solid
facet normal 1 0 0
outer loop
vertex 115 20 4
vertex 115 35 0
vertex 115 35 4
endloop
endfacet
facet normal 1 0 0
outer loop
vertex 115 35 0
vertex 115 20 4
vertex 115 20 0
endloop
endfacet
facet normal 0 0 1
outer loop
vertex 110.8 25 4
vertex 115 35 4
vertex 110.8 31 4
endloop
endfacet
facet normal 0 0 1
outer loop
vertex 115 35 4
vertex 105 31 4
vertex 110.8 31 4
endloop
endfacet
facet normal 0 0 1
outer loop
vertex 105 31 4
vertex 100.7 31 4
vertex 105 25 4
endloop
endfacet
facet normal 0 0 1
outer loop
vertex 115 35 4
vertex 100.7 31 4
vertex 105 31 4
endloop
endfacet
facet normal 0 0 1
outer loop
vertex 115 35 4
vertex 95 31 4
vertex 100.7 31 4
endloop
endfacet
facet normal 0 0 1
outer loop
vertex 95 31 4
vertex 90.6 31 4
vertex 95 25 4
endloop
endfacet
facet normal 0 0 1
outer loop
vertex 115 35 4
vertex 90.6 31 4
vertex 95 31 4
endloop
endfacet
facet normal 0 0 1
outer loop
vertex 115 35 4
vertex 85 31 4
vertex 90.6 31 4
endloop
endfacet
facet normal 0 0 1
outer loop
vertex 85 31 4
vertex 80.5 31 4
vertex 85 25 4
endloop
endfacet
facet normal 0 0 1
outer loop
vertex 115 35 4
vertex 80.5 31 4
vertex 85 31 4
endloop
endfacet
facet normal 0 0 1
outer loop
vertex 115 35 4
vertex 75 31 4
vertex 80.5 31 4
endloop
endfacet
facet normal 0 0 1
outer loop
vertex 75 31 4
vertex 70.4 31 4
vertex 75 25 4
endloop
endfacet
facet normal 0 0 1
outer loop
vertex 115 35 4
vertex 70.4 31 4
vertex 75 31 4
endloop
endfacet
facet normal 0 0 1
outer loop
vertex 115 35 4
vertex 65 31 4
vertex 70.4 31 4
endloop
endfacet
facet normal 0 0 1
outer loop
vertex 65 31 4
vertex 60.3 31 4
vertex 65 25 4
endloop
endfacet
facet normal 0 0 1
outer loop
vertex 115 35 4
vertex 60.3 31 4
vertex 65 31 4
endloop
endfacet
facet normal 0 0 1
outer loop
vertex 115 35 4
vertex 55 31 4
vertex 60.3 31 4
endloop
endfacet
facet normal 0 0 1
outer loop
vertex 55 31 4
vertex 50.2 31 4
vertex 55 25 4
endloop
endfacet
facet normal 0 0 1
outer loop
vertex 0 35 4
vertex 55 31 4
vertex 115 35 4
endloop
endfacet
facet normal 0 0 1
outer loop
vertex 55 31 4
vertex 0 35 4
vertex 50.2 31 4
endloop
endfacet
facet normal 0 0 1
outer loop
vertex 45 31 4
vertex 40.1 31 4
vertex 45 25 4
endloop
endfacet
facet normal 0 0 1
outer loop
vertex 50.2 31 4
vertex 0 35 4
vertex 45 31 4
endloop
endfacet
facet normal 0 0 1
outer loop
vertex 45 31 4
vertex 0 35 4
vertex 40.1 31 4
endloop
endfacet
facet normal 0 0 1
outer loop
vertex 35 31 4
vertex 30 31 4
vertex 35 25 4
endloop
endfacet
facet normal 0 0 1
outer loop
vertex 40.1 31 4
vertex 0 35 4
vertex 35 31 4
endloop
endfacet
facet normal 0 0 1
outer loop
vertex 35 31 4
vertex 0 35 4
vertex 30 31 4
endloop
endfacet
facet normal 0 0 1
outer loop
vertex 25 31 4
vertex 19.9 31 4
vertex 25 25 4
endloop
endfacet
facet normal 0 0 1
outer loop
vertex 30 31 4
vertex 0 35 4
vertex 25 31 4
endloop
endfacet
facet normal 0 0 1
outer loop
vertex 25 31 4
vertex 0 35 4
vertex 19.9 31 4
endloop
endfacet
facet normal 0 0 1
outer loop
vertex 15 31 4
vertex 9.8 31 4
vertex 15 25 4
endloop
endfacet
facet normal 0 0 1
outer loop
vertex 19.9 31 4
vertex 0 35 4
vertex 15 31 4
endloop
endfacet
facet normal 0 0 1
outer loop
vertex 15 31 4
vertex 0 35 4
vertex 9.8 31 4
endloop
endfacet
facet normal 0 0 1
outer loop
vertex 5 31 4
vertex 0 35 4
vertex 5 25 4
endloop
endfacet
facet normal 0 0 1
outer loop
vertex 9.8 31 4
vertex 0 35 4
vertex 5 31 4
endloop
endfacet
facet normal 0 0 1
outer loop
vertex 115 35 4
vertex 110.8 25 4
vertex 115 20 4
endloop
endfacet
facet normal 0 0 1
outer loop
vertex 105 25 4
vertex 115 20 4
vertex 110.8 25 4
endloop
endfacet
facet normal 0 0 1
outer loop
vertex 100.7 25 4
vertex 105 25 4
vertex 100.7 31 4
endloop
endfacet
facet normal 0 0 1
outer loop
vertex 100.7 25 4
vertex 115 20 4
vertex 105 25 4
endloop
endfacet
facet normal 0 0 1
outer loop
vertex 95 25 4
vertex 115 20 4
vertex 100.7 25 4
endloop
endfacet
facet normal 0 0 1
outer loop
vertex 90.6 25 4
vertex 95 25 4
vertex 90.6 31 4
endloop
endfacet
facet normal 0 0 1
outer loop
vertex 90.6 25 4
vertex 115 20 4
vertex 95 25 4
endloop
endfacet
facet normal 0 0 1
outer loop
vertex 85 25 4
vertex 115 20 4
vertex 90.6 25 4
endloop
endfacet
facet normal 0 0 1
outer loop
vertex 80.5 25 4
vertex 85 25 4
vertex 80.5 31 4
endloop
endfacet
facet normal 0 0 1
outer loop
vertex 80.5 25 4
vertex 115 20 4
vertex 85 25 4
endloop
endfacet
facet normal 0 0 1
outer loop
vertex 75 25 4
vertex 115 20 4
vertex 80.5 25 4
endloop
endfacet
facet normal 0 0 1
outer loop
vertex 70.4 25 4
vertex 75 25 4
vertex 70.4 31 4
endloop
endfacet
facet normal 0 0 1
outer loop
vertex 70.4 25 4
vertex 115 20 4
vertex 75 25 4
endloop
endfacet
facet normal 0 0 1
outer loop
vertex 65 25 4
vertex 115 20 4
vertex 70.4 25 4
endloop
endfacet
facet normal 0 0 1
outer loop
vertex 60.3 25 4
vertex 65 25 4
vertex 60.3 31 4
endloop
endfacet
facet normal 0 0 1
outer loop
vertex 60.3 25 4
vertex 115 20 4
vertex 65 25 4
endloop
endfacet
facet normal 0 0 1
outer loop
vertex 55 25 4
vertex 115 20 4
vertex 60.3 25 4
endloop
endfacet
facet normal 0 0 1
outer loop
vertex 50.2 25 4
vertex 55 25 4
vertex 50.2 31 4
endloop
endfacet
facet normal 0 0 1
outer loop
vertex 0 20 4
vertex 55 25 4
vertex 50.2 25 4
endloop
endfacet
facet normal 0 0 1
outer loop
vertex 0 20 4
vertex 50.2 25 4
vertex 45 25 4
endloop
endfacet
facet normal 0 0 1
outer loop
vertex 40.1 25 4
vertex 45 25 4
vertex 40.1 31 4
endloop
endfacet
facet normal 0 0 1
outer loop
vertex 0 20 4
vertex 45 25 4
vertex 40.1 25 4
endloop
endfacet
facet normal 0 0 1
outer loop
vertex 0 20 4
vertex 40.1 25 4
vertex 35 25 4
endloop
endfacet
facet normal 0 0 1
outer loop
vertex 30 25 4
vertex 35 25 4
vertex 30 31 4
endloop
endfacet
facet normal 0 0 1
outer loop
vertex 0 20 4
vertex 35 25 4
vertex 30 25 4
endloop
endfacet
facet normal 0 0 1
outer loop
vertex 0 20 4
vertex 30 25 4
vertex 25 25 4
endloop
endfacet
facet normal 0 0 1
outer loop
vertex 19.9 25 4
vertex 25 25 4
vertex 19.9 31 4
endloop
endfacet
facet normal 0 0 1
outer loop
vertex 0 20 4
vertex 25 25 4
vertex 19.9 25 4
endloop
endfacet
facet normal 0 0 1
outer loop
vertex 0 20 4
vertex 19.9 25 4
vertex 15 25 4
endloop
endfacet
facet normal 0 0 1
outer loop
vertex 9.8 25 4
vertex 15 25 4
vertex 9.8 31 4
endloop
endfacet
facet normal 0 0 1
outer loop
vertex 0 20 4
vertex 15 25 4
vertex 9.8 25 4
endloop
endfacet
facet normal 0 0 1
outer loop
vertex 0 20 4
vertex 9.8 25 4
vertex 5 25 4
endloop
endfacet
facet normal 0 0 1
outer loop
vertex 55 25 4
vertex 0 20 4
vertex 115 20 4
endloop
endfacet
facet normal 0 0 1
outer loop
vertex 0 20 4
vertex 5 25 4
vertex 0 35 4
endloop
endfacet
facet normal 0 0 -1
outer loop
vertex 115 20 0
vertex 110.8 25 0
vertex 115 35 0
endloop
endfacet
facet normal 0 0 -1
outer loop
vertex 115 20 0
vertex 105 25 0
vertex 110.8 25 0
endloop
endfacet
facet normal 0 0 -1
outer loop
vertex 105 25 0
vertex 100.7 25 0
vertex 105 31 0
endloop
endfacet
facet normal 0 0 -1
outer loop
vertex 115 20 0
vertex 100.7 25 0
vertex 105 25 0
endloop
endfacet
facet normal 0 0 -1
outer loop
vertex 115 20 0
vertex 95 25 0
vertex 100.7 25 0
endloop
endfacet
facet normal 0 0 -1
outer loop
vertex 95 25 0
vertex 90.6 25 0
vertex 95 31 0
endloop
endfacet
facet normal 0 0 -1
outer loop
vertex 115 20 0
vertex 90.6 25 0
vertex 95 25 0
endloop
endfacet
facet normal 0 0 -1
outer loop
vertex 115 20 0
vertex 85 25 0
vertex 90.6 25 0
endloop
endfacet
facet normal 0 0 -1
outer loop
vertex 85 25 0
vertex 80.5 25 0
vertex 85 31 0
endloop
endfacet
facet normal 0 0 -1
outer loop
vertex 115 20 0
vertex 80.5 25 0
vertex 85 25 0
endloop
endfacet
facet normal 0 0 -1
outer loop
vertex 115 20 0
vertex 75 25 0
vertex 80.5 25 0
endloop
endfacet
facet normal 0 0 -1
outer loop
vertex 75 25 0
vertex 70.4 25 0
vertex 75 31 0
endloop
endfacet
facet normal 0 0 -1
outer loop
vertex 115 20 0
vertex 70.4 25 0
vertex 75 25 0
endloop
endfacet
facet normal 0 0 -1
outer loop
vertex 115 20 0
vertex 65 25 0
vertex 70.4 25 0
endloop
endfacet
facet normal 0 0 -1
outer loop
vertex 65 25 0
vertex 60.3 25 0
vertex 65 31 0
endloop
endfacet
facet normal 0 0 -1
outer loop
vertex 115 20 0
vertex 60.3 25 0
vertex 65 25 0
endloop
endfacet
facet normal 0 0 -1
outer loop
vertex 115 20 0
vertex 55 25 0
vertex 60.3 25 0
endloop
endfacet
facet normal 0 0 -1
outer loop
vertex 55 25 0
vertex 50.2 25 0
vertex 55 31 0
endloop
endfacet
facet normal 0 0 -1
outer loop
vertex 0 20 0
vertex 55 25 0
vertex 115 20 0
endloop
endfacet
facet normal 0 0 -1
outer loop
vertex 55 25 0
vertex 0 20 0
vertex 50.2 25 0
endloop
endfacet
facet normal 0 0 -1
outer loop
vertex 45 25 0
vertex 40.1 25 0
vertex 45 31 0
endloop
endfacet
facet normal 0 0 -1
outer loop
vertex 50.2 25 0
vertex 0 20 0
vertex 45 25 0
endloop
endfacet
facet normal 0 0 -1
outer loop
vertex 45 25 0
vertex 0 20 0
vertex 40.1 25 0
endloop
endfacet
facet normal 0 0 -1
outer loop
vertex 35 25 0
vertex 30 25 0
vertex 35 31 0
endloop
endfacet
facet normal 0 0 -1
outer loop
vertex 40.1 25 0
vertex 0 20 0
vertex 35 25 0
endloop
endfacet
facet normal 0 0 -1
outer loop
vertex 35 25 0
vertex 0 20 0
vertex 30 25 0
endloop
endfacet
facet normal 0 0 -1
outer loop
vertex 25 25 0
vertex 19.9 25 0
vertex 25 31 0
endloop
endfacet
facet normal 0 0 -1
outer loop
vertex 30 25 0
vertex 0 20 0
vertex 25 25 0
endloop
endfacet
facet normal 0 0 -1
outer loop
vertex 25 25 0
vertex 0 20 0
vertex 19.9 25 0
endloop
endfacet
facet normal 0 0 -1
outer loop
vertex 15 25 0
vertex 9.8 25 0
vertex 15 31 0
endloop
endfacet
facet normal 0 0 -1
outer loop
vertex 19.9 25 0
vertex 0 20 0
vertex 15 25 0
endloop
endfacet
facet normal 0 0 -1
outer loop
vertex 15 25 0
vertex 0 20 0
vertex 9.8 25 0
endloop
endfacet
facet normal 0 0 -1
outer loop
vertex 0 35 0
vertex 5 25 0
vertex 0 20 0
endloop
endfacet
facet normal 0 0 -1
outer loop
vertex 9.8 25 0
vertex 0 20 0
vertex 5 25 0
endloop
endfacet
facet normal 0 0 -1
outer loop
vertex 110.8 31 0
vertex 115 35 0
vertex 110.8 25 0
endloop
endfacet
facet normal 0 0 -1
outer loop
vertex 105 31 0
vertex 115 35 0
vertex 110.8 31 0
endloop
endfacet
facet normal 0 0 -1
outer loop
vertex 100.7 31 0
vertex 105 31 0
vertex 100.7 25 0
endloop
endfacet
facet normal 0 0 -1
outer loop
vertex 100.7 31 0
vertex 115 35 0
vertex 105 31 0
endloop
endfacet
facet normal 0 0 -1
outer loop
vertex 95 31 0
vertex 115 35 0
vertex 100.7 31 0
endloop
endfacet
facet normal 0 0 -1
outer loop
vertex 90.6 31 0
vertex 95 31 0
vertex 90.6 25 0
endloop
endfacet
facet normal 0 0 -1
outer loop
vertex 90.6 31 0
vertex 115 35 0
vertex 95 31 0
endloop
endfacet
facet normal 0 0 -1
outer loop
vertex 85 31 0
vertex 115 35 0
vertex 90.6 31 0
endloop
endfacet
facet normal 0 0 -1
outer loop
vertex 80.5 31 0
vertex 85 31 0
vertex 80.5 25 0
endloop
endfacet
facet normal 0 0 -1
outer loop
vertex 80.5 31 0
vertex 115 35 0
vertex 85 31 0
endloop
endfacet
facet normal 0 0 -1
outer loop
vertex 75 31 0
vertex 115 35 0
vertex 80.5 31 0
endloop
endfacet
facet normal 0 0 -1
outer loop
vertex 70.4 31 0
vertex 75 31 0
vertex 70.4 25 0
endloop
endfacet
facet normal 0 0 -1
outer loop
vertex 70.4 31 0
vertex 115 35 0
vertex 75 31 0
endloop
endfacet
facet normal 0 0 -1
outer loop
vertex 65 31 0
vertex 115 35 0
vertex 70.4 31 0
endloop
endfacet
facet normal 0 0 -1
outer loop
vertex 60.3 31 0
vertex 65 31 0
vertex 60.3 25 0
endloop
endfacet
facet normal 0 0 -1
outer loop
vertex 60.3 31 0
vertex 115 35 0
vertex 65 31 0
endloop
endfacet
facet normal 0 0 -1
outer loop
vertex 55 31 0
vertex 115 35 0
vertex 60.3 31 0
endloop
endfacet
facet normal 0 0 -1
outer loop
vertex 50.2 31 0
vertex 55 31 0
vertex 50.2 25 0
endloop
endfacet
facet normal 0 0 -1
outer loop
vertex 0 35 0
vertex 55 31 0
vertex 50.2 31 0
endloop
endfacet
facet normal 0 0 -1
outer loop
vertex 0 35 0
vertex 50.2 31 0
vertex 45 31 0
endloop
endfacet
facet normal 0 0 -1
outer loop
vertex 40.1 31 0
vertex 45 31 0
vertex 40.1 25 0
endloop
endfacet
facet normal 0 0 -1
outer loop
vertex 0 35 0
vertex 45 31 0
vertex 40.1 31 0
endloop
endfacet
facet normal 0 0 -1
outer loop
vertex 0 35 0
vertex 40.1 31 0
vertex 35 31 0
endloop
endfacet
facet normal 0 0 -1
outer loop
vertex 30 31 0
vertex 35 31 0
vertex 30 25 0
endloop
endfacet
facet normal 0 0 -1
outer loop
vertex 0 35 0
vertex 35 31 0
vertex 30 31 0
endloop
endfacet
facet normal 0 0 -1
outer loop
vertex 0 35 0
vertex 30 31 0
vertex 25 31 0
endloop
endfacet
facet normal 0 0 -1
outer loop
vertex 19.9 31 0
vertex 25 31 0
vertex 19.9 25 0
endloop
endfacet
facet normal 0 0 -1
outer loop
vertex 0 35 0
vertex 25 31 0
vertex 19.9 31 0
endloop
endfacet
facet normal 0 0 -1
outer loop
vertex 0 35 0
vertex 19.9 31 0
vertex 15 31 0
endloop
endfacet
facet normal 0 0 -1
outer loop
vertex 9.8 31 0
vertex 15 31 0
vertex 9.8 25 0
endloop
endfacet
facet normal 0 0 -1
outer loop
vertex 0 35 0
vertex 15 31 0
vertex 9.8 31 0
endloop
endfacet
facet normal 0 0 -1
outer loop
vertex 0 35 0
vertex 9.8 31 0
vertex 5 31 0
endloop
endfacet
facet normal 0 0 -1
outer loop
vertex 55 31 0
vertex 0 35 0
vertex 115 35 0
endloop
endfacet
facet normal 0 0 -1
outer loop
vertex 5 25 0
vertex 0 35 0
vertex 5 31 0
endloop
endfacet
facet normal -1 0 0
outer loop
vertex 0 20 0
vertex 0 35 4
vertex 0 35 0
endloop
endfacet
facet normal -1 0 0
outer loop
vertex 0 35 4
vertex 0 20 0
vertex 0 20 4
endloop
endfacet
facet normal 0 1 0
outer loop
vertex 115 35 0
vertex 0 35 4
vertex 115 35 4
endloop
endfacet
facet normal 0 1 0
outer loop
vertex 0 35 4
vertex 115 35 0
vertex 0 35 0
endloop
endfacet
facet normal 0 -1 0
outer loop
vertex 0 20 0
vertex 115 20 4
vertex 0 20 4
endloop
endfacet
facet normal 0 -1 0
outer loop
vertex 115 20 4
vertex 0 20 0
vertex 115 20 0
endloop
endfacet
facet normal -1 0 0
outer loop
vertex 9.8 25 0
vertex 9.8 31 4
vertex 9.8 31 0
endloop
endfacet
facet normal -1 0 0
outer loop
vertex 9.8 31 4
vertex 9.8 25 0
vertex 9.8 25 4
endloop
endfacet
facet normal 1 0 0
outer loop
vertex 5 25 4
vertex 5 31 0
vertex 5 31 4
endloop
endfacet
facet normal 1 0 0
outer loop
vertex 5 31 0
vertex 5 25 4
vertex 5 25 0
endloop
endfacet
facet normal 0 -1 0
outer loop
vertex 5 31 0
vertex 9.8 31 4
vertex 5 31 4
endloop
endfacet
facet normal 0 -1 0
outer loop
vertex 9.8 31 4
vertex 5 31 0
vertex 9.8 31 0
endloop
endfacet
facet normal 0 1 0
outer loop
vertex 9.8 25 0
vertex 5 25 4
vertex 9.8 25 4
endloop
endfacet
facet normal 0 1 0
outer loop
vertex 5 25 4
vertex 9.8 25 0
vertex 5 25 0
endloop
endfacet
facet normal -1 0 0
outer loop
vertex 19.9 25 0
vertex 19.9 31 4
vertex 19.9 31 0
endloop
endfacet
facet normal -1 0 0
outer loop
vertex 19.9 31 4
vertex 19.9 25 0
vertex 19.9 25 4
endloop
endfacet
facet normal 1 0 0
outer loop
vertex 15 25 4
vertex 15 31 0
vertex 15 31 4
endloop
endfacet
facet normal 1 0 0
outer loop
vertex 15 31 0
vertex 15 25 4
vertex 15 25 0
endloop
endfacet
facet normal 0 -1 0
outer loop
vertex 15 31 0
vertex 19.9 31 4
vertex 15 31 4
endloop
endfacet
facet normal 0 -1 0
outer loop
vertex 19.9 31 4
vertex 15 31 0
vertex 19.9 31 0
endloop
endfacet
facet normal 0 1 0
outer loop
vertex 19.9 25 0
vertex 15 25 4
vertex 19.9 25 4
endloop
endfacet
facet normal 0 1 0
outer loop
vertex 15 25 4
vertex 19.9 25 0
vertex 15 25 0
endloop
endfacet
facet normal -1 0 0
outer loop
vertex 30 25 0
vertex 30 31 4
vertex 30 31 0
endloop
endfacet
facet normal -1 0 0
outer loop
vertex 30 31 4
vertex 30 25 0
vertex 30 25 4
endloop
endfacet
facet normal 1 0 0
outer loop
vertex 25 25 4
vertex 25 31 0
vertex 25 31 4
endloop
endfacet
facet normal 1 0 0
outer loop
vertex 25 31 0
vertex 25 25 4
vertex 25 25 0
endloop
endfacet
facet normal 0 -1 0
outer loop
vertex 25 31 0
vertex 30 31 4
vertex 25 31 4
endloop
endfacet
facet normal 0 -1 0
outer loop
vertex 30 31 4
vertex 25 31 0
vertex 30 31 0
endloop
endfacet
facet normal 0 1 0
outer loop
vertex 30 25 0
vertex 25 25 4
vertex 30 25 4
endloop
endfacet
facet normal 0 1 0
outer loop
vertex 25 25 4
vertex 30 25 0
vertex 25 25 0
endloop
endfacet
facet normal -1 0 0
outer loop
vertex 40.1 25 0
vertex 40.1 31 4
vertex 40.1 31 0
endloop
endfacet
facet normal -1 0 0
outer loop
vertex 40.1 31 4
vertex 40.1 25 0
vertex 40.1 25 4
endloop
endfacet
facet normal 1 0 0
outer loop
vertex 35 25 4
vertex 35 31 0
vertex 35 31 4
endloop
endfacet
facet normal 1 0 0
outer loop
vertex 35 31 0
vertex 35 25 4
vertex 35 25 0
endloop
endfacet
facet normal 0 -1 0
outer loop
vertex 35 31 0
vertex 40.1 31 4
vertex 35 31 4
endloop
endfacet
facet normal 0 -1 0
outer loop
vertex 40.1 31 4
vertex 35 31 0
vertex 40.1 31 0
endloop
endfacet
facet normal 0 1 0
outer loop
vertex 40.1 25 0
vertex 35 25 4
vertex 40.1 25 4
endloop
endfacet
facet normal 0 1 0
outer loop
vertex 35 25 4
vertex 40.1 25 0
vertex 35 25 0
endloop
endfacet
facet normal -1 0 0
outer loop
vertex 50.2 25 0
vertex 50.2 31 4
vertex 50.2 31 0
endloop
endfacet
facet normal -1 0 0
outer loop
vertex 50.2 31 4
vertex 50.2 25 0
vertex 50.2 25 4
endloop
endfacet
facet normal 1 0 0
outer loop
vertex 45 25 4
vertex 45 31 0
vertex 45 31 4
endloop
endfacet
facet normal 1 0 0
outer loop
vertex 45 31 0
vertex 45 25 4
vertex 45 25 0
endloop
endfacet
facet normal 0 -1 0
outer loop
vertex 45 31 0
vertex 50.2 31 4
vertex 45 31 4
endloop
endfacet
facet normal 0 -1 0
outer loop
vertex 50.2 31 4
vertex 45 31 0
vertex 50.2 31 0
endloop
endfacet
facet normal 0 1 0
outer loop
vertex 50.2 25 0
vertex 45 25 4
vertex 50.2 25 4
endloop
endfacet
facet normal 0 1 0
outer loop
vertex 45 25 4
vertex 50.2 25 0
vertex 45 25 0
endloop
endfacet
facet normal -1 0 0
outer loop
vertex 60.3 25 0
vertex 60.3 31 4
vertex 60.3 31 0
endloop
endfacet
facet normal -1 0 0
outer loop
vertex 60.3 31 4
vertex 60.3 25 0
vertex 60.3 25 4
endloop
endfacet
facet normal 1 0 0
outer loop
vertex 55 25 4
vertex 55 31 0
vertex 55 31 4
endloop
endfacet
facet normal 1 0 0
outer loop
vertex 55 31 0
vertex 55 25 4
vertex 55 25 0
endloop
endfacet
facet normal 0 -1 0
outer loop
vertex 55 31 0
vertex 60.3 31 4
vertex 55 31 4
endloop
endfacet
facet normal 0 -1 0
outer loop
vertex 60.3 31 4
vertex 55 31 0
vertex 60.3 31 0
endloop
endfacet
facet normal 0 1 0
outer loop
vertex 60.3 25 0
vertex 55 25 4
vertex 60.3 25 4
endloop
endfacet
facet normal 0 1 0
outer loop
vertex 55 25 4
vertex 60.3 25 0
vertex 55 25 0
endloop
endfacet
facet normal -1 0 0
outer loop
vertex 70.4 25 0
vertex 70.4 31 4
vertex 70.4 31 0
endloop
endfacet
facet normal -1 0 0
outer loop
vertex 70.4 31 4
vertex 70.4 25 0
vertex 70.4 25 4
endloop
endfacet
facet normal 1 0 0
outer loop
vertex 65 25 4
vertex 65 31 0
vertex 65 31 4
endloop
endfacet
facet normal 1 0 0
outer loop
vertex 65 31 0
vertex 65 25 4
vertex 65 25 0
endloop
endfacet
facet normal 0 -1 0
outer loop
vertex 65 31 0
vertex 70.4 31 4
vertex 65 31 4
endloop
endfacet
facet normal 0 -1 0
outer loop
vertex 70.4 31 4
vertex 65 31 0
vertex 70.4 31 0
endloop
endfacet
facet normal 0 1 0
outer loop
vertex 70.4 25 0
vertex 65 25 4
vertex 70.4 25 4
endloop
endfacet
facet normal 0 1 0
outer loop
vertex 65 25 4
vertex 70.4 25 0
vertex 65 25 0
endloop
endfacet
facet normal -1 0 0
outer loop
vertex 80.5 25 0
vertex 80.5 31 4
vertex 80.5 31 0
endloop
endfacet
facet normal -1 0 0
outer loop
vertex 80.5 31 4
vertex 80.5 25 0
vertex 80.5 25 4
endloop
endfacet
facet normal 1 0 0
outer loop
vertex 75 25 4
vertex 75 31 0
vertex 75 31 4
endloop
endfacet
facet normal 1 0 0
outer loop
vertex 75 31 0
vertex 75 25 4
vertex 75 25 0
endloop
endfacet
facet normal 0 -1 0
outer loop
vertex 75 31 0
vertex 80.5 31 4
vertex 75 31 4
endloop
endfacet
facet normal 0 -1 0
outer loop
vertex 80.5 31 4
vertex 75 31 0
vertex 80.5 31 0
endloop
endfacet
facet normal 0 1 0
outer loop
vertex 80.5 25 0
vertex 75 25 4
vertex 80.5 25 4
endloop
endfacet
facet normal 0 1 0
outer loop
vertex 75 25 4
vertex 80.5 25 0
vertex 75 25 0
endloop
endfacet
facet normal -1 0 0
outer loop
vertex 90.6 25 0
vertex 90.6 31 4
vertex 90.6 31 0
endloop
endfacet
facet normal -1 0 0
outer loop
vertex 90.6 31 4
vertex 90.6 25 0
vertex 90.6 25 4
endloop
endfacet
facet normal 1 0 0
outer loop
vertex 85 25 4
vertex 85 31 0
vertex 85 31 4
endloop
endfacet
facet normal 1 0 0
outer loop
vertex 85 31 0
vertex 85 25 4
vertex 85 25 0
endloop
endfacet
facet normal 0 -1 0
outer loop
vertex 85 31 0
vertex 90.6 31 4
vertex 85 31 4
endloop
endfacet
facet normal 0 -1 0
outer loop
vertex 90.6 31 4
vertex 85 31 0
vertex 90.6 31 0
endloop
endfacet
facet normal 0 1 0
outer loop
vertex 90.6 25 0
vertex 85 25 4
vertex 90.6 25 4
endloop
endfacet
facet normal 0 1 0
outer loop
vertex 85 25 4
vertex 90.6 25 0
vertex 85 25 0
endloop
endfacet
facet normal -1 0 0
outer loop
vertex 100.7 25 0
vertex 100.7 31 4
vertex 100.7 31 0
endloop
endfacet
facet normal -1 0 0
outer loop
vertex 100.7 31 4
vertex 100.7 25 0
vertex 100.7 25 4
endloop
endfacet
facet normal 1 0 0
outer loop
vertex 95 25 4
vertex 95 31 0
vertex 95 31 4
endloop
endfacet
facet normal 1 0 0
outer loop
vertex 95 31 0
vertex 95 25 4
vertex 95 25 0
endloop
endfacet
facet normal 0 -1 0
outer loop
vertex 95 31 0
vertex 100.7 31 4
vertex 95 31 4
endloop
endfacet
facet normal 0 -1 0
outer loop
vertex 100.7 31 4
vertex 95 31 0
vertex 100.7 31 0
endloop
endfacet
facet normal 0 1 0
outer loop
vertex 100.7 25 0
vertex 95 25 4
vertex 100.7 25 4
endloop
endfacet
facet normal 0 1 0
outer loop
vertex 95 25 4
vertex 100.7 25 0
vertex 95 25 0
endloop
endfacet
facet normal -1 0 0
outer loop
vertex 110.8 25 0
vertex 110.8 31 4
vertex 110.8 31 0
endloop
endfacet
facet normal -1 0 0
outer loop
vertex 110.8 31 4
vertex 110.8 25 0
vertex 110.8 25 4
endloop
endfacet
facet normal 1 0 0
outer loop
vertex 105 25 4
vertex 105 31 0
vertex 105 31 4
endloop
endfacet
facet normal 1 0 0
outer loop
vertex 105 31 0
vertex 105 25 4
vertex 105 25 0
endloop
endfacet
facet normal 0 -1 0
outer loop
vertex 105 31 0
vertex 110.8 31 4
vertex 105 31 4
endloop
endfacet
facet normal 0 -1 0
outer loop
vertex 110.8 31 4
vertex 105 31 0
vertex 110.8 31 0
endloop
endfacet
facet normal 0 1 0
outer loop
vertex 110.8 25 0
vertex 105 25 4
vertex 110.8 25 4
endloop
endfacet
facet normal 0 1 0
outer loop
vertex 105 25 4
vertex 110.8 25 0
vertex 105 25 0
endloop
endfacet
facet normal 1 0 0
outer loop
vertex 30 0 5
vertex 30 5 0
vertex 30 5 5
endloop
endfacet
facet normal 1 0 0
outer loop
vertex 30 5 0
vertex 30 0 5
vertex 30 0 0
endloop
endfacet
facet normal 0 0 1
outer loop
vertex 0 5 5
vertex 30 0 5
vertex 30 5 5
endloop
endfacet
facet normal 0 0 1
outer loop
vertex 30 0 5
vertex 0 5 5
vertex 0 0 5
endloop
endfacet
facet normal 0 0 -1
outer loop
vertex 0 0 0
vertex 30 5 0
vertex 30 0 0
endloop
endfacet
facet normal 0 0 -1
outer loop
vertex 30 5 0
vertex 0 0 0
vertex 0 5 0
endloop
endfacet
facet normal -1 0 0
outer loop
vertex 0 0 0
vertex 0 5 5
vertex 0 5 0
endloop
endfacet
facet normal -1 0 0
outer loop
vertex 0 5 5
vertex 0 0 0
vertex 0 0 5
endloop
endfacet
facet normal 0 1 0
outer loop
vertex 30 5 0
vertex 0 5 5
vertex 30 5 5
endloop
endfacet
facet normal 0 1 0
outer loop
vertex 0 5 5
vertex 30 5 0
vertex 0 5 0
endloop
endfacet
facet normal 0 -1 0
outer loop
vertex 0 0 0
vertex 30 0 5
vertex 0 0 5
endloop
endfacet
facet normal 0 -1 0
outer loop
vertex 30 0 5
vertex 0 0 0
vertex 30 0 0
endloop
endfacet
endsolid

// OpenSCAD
cube( [30, 5, 5] );

translate( [0, 20, 0] )
{
    difference()
    {
        cube( [115, 15, 4] );
        translate( [5, 5, 0]) cube( [4.8, 6.0, 5 ] );
        translate( [15, 5, 0]) cube( [4.9, 6.0, 5 ] );
        translate( [25, 5, 0]) cube( [5, 6.0, 5 ] );
        translate( [35, 5, 0]) cube( [5.1, 6.0, 5 ] );
        translate( [45, 5, 0]) cube( [5.2, 6.0, 5 ] );
        translate( [55, 5, 0]) cube( [5.3, 6.0, 5 ] );
        translate( [65, 5, 0]) cube( [5.4, 6.0, 5 ] );
        translate( [75, 5, 0]) cube( [5.5, 6.0, 5 ] );
        translate( [85, 5, 0]) cube( [5.6, 6.0, 5 ] );
        translate( [95, 5, 0]) cube( [5.7, 6.0, 5 ] );
        translate( [105, 5, 0]) cube( [5.8, 6.0, 5 ] );
    }
}
